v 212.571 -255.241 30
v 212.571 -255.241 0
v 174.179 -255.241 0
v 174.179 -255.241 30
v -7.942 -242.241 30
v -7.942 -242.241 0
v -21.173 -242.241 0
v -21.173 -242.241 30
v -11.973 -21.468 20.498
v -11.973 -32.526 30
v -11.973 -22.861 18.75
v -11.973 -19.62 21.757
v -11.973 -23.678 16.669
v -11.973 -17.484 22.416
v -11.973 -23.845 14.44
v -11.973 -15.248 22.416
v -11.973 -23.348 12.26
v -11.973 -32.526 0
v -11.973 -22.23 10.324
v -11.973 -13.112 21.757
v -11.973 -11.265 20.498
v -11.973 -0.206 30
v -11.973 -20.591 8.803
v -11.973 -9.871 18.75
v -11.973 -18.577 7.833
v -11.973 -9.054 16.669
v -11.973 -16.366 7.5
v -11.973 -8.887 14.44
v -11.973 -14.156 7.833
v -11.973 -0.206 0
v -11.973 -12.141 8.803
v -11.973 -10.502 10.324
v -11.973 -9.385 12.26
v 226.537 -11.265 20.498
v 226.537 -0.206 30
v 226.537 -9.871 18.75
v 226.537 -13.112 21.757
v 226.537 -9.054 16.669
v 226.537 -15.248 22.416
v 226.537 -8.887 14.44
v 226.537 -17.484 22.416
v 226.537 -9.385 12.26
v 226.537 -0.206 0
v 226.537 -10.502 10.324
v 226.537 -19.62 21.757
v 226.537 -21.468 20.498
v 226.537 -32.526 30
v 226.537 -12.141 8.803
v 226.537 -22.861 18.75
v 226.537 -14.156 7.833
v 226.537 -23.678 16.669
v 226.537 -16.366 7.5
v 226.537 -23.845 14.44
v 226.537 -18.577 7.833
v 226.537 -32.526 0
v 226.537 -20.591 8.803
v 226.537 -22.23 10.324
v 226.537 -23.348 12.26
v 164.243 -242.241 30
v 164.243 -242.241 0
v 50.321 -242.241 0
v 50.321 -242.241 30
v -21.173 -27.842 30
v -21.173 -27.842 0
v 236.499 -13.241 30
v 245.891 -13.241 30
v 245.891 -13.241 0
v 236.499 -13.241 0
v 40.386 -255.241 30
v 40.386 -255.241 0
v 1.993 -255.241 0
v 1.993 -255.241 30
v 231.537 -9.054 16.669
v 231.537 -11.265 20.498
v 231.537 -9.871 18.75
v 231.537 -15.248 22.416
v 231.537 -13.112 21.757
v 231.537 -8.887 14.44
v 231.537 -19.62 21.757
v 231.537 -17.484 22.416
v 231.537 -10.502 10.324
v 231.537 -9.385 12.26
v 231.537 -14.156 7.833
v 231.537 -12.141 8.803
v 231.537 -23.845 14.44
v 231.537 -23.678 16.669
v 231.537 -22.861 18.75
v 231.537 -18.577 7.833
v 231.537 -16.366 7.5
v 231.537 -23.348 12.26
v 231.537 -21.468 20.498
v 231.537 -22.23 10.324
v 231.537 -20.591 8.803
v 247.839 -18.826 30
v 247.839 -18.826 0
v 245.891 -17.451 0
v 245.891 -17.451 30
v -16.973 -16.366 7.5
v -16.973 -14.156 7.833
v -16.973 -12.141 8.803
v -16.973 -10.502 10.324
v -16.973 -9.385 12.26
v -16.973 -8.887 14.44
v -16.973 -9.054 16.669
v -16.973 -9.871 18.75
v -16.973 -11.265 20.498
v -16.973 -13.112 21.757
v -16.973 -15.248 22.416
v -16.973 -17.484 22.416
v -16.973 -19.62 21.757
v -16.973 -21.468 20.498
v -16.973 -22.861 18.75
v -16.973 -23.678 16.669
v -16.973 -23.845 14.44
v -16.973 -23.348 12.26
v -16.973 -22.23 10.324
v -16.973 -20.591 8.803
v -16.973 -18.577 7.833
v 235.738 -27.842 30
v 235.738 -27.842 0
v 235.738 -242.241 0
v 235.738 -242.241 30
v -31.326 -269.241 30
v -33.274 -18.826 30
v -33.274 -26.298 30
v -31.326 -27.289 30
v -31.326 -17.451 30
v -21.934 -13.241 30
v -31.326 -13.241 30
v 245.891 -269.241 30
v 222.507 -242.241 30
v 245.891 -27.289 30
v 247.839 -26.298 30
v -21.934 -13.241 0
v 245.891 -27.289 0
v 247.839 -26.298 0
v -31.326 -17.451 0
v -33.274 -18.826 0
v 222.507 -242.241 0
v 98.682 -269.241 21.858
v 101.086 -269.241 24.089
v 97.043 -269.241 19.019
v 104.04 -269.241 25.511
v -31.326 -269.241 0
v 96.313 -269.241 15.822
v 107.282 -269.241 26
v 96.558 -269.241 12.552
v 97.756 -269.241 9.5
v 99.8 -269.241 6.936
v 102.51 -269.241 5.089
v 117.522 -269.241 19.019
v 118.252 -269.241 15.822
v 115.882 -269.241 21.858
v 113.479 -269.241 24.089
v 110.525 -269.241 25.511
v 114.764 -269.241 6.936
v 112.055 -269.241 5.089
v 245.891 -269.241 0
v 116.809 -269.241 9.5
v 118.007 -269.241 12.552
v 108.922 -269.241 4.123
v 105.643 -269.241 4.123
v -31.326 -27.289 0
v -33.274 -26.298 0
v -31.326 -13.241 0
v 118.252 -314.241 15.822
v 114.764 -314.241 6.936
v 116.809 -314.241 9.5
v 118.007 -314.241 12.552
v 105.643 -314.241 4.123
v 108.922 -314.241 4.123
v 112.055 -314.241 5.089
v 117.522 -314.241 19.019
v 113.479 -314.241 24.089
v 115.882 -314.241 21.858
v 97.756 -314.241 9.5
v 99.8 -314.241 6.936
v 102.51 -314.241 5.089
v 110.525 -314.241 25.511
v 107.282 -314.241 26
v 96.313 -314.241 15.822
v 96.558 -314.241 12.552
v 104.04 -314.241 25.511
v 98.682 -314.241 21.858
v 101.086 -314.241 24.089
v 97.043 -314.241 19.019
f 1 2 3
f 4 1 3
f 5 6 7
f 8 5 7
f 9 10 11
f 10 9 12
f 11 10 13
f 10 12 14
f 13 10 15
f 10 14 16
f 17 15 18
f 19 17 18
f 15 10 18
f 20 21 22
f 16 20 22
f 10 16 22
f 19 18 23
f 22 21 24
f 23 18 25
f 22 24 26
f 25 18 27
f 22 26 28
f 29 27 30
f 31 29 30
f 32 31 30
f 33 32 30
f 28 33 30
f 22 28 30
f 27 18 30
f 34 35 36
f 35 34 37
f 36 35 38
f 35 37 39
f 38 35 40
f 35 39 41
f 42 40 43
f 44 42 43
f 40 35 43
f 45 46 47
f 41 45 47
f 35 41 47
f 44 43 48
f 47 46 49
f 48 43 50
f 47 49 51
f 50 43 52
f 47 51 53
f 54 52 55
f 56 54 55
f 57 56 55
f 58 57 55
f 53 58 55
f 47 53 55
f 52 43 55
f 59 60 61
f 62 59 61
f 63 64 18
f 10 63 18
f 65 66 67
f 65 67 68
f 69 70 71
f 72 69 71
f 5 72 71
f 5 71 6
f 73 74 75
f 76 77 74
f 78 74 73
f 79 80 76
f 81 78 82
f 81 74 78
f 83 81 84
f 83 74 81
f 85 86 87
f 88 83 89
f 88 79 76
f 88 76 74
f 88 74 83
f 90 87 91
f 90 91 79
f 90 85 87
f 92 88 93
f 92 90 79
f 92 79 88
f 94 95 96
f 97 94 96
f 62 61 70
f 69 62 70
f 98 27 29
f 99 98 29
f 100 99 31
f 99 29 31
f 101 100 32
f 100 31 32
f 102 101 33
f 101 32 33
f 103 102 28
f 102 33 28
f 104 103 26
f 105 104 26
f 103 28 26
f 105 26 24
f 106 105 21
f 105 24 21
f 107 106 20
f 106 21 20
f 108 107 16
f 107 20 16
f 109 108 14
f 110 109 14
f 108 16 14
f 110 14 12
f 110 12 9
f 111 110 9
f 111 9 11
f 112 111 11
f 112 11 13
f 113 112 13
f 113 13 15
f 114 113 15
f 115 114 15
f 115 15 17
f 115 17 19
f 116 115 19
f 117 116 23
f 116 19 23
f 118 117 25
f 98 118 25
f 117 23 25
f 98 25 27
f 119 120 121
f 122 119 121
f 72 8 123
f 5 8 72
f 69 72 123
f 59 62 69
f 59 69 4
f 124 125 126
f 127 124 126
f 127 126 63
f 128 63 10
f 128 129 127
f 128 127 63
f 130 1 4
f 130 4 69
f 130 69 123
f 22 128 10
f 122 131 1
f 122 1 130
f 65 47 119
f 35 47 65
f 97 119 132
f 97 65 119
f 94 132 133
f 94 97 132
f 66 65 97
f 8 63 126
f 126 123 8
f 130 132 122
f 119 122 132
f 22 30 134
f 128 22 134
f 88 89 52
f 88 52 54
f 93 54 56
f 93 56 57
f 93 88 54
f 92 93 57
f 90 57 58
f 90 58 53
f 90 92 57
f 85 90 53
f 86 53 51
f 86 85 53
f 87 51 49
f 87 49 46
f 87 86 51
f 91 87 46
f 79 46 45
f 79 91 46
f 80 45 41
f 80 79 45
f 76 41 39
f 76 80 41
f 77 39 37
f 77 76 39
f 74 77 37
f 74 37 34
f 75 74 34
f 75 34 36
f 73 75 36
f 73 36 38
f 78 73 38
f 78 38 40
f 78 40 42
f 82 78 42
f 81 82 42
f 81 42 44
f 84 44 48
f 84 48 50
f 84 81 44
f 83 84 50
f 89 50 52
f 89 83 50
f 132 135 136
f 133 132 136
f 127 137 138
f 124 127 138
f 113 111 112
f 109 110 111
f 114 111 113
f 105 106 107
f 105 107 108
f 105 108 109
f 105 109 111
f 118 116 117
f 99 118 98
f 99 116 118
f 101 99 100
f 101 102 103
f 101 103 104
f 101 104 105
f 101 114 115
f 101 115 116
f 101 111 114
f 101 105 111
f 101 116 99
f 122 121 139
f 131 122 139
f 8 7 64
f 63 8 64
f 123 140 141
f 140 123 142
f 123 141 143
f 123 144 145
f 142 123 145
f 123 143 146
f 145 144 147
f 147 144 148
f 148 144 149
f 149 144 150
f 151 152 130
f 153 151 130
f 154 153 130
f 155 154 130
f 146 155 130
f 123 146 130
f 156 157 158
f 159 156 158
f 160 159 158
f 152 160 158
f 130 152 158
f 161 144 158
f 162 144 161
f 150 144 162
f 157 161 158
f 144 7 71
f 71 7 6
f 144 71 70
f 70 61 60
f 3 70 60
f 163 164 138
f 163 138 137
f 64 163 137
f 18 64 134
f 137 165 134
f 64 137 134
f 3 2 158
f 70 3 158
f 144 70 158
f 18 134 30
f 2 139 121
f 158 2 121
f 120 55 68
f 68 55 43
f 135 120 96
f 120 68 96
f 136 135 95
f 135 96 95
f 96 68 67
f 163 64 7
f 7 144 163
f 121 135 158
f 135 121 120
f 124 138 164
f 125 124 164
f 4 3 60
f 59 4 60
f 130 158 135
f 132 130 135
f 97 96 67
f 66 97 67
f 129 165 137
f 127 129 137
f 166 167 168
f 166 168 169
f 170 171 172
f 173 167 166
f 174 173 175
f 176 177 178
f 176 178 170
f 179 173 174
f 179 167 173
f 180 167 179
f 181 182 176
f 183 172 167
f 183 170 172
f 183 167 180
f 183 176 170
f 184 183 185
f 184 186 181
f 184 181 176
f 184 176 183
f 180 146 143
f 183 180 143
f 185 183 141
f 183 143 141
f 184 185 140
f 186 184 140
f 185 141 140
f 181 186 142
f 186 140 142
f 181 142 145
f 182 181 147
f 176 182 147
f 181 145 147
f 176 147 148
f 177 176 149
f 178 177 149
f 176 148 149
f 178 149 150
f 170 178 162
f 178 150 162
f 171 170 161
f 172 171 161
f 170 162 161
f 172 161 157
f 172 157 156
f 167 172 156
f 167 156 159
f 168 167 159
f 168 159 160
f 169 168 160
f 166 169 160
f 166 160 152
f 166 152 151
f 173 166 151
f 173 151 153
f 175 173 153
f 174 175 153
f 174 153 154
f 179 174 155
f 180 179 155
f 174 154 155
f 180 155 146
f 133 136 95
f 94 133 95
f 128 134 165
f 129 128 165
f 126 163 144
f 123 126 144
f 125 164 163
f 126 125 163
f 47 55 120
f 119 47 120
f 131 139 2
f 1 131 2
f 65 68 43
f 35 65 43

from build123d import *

# Parameters (mm, degrees)
BOSS_EXTRUDE1_DEPTH = 30
SKETCH2_R           = 11
BOSS_EXTRUDE2_DEPTH = 45
SKETCH3_R           = 7.5
CUT_EXTRUDE1_DEPTH  = 5
CUT_EXTRUDE2_START  = -5
SKETCH4_R           = 7.5
CUT_EXTRUDE2_DEPTH  = 5


with BuildPart() as part:
    # Sketch1 → Boss-Extrude1 (new body)
    with BuildSketch(Plane.XY):
        Polygon((164.243144092, -242.240505044), (107.282313119, -242.240505044), (107.282313119, -269.240505044), (245.890540796, -269.240505044), (245.890540796, -27.289352142), (247.838560611, -26.297684258), (247.838560611, -18.825937148), (245.890540796, -17.450821047), (245.890540796, -13.240505044), (236.499007707, -13.240505044), (226.537313119, -0.206413948), (226.537313119, -32.526046634), (235.73808569, -27.842259234), (235.73808569, -242.240505044), (222.507031976, -242.240505044), (212.571392529, -255.240505044), (174.178783539, -255.240505044), align=None)
        Polygon((107.282313119, -242.240505044), (50.321482145, -242.240505044), (40.385842698, -255.240505044), (1.993233708, -255.240505044), (-7.942405739, -242.240505044), (-21.173459453, -242.240505044), (-21.173459453, -27.842259234), (-11.972686881, -32.526046634), (-11.972686881, -0.206413948), (-21.93438147, -13.240505044), (-31.325914559, -13.240505044), (-31.325914559, -17.450821047), (-33.273934374, -18.825937148), (-33.273934374, -26.297684258), (-31.325914559, -27.289352142), (-31.325914559, -269.240505044), (107.282313119, -269.240505044), align=None)
    extrude(amount=BOSS_EXTRUDE1_DEPTH)

    # Sketch2 → Boss-Extrude2 (add)
    with BuildSketch(Plane.XZ.offset(269.240505044)):
        with Locations(Location((107.282313119, 15, 0), (0, 0, 90))):
            Circle(SKETCH2_R)
    extrude(amount=BOSS_EXTRUDE2_DEPTH)

    # Sketch3 → Cut-Extrude1 (cut)
    with BuildSketch(Plane(origin=(-11.972686881, 0, 0), x_dir=(0, 0, -1), z_dir=(1, 0, 0))):
        with Locations((-15, -16.366230291)):
            Circle(SKETCH3_R)
    extrude(amount=-CUT_EXTRUDE1_DEPTH, mode=Mode.SUBTRACT)

    # Sketch4 → Cut-Extrude2 (cut)
    with BuildSketch(Plane.ZY.offset(-226.537313119).offset(CUT_EXTRUDE2_START)):
        with Locations(Location((15, -16.366230291, 0), (0, 0, 180))):
            Circle(SKETCH4_R)
    extrude(amount=CUT_EXTRUDE2_DEPTH, mode=Mode.SUBTRACT)


solid = part.part
